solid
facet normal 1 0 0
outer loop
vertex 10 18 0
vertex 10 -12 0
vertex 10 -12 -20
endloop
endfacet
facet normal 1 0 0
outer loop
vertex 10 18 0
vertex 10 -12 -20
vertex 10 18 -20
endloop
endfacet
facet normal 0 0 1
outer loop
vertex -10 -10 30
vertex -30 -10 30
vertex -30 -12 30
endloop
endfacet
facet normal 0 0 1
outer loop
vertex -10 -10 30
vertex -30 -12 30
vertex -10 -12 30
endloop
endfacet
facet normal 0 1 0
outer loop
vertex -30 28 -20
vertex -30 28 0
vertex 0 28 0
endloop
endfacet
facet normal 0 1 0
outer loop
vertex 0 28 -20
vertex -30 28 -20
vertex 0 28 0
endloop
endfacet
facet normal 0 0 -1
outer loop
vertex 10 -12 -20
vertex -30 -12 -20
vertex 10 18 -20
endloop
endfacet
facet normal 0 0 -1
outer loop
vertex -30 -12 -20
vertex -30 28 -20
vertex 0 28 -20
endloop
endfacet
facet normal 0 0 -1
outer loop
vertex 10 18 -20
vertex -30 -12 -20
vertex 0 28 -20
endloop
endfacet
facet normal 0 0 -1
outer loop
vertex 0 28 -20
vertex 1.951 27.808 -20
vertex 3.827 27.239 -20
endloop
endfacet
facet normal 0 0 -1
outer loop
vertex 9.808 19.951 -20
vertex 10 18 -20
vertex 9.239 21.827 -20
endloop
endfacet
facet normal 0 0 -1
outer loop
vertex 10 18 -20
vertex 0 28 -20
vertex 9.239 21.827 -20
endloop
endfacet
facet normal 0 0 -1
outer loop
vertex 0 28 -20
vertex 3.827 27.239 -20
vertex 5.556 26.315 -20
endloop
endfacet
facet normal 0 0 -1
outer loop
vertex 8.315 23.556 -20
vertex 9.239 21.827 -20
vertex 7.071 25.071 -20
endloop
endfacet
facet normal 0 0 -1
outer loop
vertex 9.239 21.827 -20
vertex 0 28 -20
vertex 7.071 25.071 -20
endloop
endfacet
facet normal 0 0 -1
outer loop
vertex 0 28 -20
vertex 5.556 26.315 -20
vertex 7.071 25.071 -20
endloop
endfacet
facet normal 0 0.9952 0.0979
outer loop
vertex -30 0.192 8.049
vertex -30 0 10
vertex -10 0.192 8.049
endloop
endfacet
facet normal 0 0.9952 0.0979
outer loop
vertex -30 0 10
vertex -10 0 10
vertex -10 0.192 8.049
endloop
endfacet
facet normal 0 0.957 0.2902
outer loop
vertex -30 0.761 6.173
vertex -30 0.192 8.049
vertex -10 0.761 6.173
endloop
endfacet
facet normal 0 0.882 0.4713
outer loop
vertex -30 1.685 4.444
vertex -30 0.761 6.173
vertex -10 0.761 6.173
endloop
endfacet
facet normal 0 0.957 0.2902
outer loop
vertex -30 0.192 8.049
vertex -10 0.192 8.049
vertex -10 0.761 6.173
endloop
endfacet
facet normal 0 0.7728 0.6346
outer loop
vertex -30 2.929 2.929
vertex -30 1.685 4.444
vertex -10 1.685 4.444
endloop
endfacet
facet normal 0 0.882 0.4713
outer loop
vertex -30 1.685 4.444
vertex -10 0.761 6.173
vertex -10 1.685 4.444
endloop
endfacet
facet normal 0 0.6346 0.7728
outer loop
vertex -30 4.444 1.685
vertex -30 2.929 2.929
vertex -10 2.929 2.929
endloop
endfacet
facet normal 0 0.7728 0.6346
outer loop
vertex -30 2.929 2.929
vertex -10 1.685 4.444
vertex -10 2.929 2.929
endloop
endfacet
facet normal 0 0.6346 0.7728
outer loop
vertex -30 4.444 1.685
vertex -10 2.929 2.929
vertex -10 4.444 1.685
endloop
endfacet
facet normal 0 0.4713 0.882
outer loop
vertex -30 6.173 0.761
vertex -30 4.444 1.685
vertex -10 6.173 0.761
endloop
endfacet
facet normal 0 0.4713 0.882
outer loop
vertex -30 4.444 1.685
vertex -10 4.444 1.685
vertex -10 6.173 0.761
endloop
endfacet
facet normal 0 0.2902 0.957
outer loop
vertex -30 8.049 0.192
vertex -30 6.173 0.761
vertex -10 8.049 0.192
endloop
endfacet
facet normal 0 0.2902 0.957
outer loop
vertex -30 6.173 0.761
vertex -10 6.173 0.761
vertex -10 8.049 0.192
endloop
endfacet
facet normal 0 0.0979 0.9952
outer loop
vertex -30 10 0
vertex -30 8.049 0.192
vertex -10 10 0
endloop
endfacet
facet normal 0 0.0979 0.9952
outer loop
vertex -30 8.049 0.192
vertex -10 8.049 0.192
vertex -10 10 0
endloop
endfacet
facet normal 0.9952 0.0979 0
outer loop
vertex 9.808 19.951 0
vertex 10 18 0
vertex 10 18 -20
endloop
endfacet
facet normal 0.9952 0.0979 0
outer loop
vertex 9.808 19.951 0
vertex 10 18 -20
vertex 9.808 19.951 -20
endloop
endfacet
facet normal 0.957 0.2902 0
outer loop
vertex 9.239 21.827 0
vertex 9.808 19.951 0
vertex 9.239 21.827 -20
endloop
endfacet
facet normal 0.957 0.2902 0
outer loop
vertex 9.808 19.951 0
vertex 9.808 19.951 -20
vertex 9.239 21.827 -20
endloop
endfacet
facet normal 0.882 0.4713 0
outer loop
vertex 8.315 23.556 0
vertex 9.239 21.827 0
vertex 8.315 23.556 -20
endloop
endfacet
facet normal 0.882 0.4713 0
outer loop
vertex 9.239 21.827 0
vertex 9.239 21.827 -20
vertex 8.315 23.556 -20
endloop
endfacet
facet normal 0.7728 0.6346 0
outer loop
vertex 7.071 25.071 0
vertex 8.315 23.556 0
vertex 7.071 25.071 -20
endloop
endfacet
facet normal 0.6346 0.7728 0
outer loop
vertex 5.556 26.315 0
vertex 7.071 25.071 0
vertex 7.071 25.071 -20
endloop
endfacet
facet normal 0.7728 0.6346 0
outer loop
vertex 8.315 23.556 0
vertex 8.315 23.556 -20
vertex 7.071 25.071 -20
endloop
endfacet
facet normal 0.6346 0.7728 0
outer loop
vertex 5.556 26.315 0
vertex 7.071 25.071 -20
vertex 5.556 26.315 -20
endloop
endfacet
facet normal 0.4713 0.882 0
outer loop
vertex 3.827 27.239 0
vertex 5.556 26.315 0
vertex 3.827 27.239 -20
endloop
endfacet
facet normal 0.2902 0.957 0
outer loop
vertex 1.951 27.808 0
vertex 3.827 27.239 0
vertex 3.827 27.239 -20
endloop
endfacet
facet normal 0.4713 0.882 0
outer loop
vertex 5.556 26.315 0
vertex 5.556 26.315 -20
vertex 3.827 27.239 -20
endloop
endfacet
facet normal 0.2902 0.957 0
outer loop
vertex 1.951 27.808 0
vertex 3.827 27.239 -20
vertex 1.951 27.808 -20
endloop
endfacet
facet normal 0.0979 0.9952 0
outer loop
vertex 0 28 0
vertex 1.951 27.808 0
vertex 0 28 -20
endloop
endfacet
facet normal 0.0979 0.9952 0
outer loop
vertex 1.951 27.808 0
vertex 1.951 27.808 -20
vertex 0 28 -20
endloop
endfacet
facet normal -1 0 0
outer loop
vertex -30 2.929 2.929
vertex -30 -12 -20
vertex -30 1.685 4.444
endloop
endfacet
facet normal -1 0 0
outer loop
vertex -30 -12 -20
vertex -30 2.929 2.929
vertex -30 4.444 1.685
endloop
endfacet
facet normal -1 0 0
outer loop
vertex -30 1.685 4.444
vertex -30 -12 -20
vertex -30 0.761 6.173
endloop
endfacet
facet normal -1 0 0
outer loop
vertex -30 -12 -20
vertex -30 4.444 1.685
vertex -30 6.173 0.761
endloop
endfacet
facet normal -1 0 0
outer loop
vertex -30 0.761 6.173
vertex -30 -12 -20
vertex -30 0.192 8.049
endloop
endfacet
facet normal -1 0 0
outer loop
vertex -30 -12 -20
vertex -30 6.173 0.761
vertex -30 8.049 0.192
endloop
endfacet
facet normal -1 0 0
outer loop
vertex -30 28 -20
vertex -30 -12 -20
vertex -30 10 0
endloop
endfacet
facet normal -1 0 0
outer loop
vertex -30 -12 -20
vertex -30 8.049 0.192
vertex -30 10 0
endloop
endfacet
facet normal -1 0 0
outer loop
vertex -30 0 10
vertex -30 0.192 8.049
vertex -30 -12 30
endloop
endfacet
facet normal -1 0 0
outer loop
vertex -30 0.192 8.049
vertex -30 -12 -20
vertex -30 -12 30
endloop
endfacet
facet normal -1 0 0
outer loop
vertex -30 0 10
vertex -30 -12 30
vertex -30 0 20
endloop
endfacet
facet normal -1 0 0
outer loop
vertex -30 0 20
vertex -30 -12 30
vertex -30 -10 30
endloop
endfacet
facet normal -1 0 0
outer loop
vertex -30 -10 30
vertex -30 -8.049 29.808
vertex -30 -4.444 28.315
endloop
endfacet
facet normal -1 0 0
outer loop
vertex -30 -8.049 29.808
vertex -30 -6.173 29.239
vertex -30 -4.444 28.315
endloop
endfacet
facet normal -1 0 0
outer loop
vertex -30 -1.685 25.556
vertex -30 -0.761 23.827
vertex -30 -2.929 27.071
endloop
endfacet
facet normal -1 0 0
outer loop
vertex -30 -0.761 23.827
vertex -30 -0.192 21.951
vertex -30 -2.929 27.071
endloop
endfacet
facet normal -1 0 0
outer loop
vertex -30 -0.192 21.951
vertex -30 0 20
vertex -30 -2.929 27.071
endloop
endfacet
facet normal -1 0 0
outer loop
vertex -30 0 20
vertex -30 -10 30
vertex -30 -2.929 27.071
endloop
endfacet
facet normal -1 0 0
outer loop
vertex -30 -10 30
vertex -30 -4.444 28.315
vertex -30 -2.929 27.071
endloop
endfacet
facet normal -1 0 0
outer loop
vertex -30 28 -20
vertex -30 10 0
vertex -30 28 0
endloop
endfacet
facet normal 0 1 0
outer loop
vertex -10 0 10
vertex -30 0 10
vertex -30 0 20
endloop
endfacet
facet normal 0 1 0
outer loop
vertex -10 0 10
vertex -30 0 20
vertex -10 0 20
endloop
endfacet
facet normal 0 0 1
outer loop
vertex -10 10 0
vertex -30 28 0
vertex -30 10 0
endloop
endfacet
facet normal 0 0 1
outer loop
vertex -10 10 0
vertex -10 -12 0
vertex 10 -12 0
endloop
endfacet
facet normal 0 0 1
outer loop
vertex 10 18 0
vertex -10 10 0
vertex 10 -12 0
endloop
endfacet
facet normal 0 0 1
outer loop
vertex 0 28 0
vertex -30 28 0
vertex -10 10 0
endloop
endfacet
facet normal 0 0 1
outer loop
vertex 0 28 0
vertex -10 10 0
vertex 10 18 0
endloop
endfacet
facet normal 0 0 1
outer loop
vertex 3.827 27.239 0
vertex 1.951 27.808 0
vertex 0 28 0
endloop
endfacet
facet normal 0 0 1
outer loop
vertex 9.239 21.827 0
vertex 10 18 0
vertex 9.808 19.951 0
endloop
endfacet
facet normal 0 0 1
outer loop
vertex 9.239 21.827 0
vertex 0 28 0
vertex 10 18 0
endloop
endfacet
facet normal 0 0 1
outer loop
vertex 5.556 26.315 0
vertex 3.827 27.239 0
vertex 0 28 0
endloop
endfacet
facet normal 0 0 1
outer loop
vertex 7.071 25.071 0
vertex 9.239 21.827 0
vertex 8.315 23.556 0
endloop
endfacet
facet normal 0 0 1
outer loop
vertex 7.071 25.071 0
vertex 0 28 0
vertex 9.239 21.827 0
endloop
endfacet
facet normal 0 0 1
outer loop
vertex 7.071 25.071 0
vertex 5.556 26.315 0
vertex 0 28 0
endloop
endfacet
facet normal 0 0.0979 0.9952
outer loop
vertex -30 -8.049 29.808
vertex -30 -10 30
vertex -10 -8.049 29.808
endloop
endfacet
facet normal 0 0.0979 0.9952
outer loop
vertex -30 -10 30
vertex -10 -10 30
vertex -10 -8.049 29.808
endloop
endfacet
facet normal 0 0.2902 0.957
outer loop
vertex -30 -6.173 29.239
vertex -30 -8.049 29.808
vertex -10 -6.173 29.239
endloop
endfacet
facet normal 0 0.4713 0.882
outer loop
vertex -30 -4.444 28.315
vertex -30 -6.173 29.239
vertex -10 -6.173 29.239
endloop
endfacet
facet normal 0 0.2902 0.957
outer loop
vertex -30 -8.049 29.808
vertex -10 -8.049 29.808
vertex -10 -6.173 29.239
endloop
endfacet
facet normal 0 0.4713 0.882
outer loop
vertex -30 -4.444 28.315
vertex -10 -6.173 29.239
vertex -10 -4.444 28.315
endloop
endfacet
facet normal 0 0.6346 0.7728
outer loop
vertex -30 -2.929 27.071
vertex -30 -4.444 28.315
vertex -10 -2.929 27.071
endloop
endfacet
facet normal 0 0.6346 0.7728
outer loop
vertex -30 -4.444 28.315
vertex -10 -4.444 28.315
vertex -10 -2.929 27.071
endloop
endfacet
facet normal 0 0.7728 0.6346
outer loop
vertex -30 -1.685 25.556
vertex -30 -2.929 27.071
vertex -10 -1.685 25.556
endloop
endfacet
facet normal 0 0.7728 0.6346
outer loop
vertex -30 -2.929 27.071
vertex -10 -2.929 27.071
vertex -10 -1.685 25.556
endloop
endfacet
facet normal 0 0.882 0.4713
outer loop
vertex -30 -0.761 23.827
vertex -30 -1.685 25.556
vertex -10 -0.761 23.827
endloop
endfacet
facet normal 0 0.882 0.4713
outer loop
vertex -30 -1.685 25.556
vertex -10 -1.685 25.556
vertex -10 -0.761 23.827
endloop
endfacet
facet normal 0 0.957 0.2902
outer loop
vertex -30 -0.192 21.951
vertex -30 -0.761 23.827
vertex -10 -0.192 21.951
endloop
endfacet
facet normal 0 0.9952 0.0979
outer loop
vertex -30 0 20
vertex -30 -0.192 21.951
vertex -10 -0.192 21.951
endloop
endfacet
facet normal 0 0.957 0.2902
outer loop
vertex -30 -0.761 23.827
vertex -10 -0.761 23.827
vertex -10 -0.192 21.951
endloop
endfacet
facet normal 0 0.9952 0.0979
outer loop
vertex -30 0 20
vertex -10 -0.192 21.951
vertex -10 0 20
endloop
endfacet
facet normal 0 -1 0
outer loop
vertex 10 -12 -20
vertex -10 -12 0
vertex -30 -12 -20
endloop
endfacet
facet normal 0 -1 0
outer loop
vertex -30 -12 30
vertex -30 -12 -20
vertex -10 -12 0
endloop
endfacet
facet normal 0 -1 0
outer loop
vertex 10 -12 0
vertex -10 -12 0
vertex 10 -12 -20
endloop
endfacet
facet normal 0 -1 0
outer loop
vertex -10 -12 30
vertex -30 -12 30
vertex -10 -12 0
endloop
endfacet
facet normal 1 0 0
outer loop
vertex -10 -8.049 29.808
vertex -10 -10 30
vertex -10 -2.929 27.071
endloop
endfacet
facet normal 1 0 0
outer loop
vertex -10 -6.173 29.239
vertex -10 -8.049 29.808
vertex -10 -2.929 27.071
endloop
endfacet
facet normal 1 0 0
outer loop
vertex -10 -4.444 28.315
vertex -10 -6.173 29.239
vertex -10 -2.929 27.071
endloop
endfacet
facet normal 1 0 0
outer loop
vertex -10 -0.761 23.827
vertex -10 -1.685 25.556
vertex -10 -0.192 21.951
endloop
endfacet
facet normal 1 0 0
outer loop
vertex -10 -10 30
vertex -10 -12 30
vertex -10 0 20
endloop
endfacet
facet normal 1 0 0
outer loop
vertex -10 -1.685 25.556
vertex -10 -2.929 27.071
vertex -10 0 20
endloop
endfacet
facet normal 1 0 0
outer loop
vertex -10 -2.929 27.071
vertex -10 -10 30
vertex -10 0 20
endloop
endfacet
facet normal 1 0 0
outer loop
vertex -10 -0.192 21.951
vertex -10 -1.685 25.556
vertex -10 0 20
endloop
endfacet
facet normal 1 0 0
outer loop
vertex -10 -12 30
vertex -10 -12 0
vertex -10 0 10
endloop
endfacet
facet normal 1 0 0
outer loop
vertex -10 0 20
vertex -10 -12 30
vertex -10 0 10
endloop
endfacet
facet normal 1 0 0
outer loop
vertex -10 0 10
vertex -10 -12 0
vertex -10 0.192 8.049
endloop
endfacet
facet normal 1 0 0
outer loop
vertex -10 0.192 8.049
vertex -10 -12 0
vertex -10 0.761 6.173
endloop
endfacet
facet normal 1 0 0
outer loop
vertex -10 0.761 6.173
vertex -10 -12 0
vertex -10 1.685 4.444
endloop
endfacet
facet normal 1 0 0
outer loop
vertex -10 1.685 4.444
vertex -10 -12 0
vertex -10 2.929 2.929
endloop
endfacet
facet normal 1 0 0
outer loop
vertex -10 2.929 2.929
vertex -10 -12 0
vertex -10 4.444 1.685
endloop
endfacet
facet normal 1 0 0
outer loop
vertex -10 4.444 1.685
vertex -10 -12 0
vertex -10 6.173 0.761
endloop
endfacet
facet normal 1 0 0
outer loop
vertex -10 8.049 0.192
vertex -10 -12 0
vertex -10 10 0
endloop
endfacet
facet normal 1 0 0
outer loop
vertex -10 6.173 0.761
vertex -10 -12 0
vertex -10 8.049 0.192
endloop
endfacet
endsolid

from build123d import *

# Parameters (mm, degrees)
SKETCH1_W           = 20
SKETCH1_H           = 12
BOSS_EXTRUDE1_DEPTH = 30
SKETCH2_W           = 40
SKETCH2_H           = 40
BOSS_EXTRUDE2_DEPTH = 20
FILLET1_R           = 10


with BuildPart() as part:
    # Sketch1 → Boss-Extrude1 (new body)
    with BuildSketch(Plane.XY):
        with Locations((-20, -6)):
            Rectangle(SKETCH1_W, SKETCH1_H)
    extrude(amount=BOSS_EXTRUDE1_DEPTH)

    # Sketch2 → Boss-Extrude2 (add)
    with BuildSketch(Plane.XY):
        with Locations((-10, 8)):
            Rectangle(SKETCH2_W, SKETCH2_H)
    extrude(amount=-BOSS_EXTRUDE2_DEPTH)

    # Fillet1
    fillet1_edges = [part.edges().sort_by_distance(p)[0] for p in [
        (10, 28, -10),
        (-20, 0, 30),
        (-20, 0, 0),
    ]]
    fillet(fillet1_edges, radius=FILLET1_R)


solid = part.part
